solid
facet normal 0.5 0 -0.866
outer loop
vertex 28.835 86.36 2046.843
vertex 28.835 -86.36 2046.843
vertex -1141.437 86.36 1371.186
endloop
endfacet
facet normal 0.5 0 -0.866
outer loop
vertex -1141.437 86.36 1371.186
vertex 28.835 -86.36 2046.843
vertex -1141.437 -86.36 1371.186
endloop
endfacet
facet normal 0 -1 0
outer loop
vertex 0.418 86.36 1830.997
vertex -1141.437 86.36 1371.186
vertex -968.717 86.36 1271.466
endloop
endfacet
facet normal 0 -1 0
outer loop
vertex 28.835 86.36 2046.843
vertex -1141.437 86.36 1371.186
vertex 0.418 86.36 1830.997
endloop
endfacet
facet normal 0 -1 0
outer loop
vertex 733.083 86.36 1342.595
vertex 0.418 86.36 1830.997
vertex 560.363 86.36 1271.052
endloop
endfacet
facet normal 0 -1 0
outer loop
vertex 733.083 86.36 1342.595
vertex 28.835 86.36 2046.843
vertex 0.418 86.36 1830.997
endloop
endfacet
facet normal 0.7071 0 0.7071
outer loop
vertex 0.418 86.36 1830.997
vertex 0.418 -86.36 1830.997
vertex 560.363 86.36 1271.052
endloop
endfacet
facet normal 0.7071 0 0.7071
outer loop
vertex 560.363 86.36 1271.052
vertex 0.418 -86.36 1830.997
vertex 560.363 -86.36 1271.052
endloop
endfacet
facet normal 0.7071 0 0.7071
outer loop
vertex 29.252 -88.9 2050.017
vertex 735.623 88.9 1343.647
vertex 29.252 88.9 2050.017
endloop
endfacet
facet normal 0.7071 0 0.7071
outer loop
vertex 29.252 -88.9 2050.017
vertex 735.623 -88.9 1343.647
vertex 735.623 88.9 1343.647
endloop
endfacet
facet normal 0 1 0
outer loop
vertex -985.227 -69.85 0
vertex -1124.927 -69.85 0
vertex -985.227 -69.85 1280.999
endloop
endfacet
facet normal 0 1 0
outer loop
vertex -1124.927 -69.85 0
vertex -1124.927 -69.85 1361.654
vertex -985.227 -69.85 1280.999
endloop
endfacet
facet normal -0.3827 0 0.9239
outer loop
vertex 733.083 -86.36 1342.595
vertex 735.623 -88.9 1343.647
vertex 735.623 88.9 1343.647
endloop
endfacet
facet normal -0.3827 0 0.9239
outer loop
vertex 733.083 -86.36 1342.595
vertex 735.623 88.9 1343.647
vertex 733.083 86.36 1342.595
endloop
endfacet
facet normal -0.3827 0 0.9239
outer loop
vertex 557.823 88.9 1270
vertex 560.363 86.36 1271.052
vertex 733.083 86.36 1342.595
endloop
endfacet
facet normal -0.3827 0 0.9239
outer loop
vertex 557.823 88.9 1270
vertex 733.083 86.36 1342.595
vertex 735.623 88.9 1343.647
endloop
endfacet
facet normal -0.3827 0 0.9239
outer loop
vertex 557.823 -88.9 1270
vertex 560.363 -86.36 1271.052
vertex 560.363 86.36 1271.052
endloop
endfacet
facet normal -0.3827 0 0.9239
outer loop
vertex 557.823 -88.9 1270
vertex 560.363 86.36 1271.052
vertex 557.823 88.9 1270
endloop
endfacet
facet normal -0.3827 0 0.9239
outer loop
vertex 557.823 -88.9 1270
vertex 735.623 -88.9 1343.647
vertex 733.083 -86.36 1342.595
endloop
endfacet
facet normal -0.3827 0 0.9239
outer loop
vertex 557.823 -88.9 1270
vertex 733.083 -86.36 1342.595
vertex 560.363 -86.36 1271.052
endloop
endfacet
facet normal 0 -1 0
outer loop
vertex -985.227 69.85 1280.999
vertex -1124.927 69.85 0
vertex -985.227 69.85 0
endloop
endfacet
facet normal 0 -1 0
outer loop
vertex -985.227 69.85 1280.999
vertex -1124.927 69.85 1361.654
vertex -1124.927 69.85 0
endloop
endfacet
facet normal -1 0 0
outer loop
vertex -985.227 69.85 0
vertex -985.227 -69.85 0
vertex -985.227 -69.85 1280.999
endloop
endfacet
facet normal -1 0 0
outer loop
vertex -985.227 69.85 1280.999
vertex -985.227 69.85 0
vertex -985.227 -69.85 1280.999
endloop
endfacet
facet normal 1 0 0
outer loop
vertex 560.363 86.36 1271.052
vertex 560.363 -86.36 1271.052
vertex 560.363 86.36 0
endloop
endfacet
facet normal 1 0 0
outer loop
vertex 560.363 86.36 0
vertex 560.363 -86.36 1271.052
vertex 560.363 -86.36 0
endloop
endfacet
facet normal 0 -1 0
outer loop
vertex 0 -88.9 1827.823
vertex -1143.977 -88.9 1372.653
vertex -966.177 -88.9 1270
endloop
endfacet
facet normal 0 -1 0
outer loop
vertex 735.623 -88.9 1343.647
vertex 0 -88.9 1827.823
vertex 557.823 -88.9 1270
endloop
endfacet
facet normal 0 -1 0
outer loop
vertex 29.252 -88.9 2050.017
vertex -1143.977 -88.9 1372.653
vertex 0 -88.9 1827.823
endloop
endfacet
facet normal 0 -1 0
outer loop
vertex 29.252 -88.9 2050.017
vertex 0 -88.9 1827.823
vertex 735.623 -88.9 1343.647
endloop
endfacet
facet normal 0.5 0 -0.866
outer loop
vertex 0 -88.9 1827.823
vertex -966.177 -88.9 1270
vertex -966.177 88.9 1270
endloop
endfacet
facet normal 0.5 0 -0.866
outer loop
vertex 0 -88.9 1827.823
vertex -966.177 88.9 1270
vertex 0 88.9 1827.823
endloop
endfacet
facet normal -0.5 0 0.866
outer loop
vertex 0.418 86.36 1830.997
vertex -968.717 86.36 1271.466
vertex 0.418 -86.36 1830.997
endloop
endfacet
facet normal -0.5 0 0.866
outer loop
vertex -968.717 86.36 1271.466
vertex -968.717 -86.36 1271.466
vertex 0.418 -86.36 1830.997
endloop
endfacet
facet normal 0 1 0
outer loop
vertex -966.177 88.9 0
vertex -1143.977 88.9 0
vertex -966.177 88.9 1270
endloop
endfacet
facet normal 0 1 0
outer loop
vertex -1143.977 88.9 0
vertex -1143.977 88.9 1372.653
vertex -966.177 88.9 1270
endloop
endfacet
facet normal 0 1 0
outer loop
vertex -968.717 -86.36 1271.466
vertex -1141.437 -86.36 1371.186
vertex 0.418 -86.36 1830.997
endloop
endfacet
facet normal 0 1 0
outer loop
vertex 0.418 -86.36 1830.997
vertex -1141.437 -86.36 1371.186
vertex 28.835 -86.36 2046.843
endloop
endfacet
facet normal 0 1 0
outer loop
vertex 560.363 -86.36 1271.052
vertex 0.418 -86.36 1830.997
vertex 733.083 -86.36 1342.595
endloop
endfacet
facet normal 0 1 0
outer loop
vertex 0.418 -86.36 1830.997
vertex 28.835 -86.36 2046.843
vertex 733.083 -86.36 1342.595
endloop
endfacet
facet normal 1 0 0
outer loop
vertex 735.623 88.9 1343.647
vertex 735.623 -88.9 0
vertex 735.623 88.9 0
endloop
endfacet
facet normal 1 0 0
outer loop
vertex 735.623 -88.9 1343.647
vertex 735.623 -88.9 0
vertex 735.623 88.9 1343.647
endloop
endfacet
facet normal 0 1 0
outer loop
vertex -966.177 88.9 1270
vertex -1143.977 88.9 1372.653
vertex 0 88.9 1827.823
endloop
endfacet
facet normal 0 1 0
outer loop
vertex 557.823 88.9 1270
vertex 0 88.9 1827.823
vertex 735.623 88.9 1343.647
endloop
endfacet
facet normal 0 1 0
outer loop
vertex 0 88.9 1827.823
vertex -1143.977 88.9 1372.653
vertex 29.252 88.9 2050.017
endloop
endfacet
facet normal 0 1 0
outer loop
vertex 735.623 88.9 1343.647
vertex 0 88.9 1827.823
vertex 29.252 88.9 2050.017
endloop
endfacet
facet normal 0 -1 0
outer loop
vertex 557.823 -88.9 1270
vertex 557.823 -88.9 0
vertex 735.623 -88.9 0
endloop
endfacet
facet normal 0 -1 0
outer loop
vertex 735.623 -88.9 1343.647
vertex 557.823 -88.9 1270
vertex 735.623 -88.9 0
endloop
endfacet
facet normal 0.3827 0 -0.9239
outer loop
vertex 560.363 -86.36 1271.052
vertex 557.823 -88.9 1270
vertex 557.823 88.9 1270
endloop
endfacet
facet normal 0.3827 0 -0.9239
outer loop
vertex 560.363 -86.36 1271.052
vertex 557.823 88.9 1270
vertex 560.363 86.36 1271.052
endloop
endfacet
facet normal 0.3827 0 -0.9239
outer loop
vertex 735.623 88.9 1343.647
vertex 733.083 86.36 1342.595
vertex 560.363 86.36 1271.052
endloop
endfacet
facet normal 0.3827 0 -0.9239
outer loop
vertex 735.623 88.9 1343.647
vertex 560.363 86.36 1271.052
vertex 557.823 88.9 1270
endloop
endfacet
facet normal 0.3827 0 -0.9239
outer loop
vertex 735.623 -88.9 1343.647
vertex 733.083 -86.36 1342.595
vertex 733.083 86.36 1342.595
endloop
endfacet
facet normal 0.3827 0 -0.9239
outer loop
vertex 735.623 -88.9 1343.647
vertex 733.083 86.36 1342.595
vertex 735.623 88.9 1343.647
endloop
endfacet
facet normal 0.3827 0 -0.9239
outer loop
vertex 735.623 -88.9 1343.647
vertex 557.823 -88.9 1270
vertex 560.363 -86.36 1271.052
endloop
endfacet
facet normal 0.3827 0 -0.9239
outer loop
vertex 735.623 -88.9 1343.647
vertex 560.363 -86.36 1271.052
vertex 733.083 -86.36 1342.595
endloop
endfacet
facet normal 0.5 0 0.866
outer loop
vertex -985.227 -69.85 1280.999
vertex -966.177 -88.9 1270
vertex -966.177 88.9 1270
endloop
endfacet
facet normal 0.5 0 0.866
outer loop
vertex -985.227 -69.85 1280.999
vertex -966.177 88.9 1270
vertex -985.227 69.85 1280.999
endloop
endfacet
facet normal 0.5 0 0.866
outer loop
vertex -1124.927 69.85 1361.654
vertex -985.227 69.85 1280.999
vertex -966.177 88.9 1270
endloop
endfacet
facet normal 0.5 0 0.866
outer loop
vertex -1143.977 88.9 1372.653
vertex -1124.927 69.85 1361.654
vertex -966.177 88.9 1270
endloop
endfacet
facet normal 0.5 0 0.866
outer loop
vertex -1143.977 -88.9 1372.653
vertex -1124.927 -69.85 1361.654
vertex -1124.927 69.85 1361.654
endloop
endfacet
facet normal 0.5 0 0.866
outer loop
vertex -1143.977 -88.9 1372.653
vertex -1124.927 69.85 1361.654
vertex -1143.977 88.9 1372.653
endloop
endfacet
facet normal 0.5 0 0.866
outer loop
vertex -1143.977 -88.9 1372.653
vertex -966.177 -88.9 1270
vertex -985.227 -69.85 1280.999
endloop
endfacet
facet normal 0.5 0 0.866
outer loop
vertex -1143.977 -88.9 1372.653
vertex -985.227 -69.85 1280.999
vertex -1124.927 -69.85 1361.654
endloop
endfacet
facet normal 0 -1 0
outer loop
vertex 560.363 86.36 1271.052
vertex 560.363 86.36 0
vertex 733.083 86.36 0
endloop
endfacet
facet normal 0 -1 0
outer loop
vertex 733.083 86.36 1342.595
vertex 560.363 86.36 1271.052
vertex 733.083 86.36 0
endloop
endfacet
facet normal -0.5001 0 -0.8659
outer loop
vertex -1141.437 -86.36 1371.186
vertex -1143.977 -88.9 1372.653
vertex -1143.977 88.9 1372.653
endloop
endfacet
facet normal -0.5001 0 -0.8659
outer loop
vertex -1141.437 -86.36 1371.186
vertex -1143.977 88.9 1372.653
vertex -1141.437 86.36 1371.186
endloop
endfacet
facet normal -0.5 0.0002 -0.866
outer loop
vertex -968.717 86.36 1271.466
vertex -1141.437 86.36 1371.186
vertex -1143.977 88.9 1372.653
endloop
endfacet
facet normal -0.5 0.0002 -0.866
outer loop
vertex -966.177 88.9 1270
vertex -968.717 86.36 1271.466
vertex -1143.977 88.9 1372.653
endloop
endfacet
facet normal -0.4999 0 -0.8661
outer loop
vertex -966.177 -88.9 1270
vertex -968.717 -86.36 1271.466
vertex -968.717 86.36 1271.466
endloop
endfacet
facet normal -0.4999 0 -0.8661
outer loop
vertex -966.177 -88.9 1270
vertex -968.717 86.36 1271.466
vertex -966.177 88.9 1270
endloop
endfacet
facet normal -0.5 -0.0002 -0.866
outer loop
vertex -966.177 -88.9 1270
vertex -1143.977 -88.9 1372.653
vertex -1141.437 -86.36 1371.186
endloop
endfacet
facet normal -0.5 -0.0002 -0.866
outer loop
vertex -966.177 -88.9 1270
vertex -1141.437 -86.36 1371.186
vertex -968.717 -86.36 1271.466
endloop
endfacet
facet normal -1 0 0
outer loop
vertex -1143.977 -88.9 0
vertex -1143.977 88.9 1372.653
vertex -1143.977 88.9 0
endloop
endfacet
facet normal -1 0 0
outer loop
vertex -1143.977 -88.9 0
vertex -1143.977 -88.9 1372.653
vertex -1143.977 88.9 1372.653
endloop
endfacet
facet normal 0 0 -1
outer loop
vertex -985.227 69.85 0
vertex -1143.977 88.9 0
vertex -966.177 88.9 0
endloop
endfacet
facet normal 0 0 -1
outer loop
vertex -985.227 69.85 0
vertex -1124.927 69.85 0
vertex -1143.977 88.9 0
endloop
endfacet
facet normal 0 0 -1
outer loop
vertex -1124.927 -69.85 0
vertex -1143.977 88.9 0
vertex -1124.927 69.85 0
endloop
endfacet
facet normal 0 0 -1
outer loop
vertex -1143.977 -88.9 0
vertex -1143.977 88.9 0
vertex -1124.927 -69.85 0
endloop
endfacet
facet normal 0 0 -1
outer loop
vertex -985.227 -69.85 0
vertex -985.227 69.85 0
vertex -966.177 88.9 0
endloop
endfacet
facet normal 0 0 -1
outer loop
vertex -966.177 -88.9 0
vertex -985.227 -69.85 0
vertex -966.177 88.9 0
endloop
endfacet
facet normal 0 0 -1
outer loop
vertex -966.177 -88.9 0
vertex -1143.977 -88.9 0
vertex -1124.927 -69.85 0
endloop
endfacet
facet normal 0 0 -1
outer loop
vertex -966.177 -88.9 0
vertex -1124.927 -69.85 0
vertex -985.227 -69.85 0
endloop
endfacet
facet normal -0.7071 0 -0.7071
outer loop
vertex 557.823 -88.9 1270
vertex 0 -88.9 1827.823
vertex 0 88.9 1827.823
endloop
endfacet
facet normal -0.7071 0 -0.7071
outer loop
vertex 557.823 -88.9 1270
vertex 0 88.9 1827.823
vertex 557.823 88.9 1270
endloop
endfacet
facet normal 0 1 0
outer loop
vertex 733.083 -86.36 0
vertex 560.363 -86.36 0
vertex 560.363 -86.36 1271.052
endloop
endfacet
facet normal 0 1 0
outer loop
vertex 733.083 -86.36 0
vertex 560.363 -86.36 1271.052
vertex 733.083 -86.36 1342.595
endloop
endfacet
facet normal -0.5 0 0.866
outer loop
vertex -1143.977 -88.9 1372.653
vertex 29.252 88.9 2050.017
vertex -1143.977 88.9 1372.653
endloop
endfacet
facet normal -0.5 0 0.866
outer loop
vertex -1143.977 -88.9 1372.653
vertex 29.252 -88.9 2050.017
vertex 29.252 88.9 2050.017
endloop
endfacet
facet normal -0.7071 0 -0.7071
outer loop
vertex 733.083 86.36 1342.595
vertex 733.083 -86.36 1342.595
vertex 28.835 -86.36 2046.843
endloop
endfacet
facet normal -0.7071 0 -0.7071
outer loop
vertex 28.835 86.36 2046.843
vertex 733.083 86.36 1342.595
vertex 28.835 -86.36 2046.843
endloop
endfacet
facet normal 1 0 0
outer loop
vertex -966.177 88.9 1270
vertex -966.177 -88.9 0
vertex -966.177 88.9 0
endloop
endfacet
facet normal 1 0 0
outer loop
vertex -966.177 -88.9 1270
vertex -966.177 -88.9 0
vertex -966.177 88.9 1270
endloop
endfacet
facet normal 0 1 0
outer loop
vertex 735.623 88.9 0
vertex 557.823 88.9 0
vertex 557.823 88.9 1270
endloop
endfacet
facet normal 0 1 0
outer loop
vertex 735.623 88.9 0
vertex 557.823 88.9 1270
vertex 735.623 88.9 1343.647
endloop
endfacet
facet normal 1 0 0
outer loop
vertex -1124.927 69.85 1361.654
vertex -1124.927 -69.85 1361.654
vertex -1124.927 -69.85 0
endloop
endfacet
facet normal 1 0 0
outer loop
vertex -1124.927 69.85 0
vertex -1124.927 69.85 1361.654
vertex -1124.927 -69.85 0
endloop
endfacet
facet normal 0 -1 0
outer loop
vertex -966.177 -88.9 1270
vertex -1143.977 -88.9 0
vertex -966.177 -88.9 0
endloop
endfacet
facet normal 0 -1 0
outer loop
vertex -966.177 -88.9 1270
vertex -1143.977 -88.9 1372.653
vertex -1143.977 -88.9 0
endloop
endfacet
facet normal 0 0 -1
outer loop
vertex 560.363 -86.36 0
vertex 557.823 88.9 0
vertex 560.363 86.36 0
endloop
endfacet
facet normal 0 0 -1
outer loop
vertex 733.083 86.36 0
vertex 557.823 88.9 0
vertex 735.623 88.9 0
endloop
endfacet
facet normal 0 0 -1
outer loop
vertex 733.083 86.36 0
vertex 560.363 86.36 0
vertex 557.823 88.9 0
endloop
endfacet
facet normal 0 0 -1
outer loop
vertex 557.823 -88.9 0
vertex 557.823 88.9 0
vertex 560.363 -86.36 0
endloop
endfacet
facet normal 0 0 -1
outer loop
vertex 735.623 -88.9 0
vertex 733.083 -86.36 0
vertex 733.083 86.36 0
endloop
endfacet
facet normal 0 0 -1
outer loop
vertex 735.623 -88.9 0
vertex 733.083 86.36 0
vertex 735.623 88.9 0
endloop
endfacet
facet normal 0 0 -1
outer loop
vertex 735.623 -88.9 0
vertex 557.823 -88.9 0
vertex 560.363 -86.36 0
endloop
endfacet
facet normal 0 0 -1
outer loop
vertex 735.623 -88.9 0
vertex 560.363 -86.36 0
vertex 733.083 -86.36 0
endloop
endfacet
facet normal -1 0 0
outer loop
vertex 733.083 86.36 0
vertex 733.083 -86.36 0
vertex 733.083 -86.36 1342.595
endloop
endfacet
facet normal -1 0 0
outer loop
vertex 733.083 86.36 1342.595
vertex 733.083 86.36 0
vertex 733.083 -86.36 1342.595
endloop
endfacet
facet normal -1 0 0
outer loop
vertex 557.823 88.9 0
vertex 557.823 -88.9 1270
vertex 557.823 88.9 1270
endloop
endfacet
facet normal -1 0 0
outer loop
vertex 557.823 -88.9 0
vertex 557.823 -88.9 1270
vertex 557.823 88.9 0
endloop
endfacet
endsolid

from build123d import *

# Parameters (mm, degrees)
F1_DEPTH = 88.9
F2_DEPTH = 88.9
F3_DEPTH = 88.9
F4_T     = -19.05
F5_T     = -2.54
F6_T     = -2.54


with BuildPart() as f1:
    # F0 (on Front) → F1 (new body, symmetric)
    with BuildSketch(Plane.XZ):
        Polygon((-1143.9772846325, 1372.6528778619), (-966.1772846325, 1270), (0, 1827.8227153675), (557.8227153675, 1270), (735.6227153675, 1343.6471713899), (29.2524853657, 2050.0174013917), align=None)
    extrude(amount=F1_DEPTH, both=True)

    # F6
    f6_openings = [f1.faces().sort_by_distance(p)[0] for p in [
        (-1055.077285, 0, 1321.326439),
        (646.722715, 0, 1306.823586),
    ]]
    offset(amount=F6_T, openings=f6_openings, kind=Kind.INTERSECTION)


with BuildPart() as f2:
    # F0 (on Front) → F2 (new body, symmetric)
    with BuildSketch(Plane.XZ):
        Polygon((-1143.9772846325, 0), (-966.1772846325, 0), (-966.1772846325, 1270), (-1143.9772846325, 1372.6528778619), align=None)
    extrude(amount=F2_DEPTH, both=True)

    # F4
    f4_openings = [f2.faces().sort_by_distance(p)[0] for p in [
        (-1055.077285, 0, 1321.326439),
        (-1055.077285, 0, 0),
    ]]
    offset(amount=F4_T, openings=f4_openings)


with BuildPart() as f3:
    # F0 (on Front) → F3 (new body, symmetric)
    with BuildSketch(Plane.XZ):
        Polygon((735.6227153675, 1343.6471713899), (557.8227153675, 1270), (557.8227153675, 0), (735.6227153675, 0), align=None)
    extrude(amount=F3_DEPTH, both=True)

    # F5
    f5_openings = [f3.faces().sort_by_distance(p)[0] for p in [
        (646.722715, 0, 1306.823586),
        (646.722715, 0, 0),
    ]]
    offset(amount=F5_T, openings=f5_openings)


solid = Compound([f1.part, f2.part, f3.part])
